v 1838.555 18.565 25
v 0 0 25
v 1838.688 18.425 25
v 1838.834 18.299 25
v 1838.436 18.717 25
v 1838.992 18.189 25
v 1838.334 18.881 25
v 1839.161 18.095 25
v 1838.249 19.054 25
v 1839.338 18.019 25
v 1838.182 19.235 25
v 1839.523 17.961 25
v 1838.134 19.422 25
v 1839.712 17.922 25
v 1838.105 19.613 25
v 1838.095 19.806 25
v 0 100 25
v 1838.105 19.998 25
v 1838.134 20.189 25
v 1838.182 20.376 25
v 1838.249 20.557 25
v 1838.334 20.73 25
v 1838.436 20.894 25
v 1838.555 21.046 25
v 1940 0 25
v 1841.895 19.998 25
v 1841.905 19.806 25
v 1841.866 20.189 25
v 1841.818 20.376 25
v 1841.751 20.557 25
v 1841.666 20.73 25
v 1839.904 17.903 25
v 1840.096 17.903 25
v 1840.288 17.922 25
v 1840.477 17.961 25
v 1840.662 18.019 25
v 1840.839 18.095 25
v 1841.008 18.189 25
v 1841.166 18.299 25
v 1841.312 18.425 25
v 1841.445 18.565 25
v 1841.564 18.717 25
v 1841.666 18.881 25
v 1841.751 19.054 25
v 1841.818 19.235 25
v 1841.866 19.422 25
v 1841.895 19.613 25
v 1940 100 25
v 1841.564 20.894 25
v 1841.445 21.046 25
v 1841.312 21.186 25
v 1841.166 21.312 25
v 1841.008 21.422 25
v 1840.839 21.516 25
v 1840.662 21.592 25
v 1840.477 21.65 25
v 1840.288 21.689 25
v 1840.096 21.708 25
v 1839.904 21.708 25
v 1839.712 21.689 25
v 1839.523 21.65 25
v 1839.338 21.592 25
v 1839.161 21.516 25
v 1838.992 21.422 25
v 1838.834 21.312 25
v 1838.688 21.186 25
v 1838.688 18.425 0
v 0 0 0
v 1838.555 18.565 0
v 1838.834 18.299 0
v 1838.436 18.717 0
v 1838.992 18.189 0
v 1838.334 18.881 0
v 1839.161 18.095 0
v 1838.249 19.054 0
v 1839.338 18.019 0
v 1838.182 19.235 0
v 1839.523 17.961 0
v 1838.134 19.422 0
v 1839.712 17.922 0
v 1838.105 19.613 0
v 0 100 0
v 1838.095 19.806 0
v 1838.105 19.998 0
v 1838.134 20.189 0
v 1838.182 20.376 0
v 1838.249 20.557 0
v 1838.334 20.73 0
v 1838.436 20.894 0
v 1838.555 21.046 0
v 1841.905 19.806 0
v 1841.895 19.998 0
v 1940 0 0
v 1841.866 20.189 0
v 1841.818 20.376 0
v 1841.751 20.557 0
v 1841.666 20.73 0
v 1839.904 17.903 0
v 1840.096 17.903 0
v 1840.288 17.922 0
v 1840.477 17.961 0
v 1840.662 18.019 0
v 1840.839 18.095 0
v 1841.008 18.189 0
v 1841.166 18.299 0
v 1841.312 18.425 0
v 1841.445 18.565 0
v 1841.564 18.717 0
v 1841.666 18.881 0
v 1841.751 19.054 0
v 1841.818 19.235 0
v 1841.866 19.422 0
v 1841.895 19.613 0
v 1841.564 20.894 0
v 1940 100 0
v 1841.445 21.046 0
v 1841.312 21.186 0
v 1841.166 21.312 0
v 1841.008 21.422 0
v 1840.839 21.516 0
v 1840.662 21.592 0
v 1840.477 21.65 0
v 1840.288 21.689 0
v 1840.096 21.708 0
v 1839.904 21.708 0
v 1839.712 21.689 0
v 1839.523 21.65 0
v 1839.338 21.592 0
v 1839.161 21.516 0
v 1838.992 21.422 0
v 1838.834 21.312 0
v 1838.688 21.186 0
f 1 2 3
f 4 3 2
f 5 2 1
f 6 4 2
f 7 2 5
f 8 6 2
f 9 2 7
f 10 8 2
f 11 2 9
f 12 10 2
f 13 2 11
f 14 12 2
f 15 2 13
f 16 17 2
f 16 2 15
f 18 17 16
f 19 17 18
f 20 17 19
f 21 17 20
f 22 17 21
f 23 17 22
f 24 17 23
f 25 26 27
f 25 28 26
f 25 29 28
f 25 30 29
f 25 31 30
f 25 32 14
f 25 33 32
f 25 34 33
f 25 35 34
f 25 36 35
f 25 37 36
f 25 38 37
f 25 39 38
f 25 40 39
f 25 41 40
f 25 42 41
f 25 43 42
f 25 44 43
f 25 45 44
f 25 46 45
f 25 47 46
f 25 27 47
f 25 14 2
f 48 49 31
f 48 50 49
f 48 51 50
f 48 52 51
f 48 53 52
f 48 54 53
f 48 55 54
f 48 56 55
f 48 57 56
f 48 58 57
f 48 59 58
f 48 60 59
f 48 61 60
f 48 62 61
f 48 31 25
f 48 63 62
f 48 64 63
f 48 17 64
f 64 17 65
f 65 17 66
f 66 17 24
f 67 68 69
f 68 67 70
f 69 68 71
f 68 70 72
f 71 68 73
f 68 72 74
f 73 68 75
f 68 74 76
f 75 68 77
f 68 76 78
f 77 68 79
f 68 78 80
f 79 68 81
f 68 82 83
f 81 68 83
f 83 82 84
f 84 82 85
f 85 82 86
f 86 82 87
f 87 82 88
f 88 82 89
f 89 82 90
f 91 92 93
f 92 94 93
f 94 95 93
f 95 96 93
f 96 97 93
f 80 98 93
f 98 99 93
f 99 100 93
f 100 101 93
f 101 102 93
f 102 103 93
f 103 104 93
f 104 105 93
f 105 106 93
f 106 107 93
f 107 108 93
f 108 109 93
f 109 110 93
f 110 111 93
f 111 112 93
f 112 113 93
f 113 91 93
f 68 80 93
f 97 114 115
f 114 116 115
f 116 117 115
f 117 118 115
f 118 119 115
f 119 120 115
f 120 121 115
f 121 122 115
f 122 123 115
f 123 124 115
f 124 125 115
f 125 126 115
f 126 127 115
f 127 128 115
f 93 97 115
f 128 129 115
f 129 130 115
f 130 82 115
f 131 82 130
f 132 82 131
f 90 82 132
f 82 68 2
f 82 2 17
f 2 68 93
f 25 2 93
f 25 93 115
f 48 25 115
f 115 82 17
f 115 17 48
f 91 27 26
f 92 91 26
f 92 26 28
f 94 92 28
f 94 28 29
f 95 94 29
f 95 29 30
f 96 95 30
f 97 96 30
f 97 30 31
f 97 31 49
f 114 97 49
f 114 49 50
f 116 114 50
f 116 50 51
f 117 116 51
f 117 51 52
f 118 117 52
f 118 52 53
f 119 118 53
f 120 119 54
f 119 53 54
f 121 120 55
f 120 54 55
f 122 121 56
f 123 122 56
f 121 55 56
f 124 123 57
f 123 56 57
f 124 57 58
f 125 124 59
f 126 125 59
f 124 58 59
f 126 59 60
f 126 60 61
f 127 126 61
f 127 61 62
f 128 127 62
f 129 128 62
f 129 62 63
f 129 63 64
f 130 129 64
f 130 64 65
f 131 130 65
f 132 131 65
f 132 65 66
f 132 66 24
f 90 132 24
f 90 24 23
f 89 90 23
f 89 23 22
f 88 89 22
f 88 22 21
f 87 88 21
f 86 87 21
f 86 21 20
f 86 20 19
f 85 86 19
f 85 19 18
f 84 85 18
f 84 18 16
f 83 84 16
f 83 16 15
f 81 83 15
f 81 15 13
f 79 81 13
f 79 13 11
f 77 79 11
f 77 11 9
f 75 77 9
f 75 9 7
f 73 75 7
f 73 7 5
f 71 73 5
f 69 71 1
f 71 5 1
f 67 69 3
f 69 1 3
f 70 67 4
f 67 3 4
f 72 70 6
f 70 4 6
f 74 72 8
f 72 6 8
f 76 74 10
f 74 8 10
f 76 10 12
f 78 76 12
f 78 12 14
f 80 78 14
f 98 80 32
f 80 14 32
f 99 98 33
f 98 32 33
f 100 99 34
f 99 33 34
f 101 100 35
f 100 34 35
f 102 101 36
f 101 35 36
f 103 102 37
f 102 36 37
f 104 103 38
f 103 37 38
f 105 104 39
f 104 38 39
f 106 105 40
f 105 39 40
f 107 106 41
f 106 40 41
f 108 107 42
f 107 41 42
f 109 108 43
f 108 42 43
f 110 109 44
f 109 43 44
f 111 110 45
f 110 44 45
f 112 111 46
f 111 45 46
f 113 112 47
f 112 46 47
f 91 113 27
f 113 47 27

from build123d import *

# Parameters (mm, degrees)
SKETCH1_W                 = 194
SKETCH1_H                 = 10
BOSS_EXTRUDE1_DEPTH       = 2.5
SCALE1_SCALE              = 10
F_6_CLEARANCE_HOLE2_D     = 3.81
F_6_CLEARANCE_HOLE2_DEPTH = 49


with BuildPart() as part:
    # Sketch1 → Boss-Extrude1 (new body)
    with BuildSketch(Plane.XY):
        with Locations((97, 5)):
            Rectangle(SKETCH1_W, SKETCH1_H)
    extrude(amount=BOSS_EXTRUDE1_DEPTH)


with BuildPart() as part_1:
    # Scale1: scaled about (0, 0, 0)
    add(part.part.scale(SCALE1_SCALE))

    # #6 Clearance Hole2
    with Locations(Plane(origin=(2049.418477494, 550, 0), x_dir=(-1, 0, 0), z_dir=(0, 0, -1))):
        with Locations((209.418477494, -530.194488108)):
            Hole(F_6_CLEARANCE_HOLE2_D / 2, depth=F_6_CLEARANCE_HOLE2_DEPTH)


solid = part_1.part
